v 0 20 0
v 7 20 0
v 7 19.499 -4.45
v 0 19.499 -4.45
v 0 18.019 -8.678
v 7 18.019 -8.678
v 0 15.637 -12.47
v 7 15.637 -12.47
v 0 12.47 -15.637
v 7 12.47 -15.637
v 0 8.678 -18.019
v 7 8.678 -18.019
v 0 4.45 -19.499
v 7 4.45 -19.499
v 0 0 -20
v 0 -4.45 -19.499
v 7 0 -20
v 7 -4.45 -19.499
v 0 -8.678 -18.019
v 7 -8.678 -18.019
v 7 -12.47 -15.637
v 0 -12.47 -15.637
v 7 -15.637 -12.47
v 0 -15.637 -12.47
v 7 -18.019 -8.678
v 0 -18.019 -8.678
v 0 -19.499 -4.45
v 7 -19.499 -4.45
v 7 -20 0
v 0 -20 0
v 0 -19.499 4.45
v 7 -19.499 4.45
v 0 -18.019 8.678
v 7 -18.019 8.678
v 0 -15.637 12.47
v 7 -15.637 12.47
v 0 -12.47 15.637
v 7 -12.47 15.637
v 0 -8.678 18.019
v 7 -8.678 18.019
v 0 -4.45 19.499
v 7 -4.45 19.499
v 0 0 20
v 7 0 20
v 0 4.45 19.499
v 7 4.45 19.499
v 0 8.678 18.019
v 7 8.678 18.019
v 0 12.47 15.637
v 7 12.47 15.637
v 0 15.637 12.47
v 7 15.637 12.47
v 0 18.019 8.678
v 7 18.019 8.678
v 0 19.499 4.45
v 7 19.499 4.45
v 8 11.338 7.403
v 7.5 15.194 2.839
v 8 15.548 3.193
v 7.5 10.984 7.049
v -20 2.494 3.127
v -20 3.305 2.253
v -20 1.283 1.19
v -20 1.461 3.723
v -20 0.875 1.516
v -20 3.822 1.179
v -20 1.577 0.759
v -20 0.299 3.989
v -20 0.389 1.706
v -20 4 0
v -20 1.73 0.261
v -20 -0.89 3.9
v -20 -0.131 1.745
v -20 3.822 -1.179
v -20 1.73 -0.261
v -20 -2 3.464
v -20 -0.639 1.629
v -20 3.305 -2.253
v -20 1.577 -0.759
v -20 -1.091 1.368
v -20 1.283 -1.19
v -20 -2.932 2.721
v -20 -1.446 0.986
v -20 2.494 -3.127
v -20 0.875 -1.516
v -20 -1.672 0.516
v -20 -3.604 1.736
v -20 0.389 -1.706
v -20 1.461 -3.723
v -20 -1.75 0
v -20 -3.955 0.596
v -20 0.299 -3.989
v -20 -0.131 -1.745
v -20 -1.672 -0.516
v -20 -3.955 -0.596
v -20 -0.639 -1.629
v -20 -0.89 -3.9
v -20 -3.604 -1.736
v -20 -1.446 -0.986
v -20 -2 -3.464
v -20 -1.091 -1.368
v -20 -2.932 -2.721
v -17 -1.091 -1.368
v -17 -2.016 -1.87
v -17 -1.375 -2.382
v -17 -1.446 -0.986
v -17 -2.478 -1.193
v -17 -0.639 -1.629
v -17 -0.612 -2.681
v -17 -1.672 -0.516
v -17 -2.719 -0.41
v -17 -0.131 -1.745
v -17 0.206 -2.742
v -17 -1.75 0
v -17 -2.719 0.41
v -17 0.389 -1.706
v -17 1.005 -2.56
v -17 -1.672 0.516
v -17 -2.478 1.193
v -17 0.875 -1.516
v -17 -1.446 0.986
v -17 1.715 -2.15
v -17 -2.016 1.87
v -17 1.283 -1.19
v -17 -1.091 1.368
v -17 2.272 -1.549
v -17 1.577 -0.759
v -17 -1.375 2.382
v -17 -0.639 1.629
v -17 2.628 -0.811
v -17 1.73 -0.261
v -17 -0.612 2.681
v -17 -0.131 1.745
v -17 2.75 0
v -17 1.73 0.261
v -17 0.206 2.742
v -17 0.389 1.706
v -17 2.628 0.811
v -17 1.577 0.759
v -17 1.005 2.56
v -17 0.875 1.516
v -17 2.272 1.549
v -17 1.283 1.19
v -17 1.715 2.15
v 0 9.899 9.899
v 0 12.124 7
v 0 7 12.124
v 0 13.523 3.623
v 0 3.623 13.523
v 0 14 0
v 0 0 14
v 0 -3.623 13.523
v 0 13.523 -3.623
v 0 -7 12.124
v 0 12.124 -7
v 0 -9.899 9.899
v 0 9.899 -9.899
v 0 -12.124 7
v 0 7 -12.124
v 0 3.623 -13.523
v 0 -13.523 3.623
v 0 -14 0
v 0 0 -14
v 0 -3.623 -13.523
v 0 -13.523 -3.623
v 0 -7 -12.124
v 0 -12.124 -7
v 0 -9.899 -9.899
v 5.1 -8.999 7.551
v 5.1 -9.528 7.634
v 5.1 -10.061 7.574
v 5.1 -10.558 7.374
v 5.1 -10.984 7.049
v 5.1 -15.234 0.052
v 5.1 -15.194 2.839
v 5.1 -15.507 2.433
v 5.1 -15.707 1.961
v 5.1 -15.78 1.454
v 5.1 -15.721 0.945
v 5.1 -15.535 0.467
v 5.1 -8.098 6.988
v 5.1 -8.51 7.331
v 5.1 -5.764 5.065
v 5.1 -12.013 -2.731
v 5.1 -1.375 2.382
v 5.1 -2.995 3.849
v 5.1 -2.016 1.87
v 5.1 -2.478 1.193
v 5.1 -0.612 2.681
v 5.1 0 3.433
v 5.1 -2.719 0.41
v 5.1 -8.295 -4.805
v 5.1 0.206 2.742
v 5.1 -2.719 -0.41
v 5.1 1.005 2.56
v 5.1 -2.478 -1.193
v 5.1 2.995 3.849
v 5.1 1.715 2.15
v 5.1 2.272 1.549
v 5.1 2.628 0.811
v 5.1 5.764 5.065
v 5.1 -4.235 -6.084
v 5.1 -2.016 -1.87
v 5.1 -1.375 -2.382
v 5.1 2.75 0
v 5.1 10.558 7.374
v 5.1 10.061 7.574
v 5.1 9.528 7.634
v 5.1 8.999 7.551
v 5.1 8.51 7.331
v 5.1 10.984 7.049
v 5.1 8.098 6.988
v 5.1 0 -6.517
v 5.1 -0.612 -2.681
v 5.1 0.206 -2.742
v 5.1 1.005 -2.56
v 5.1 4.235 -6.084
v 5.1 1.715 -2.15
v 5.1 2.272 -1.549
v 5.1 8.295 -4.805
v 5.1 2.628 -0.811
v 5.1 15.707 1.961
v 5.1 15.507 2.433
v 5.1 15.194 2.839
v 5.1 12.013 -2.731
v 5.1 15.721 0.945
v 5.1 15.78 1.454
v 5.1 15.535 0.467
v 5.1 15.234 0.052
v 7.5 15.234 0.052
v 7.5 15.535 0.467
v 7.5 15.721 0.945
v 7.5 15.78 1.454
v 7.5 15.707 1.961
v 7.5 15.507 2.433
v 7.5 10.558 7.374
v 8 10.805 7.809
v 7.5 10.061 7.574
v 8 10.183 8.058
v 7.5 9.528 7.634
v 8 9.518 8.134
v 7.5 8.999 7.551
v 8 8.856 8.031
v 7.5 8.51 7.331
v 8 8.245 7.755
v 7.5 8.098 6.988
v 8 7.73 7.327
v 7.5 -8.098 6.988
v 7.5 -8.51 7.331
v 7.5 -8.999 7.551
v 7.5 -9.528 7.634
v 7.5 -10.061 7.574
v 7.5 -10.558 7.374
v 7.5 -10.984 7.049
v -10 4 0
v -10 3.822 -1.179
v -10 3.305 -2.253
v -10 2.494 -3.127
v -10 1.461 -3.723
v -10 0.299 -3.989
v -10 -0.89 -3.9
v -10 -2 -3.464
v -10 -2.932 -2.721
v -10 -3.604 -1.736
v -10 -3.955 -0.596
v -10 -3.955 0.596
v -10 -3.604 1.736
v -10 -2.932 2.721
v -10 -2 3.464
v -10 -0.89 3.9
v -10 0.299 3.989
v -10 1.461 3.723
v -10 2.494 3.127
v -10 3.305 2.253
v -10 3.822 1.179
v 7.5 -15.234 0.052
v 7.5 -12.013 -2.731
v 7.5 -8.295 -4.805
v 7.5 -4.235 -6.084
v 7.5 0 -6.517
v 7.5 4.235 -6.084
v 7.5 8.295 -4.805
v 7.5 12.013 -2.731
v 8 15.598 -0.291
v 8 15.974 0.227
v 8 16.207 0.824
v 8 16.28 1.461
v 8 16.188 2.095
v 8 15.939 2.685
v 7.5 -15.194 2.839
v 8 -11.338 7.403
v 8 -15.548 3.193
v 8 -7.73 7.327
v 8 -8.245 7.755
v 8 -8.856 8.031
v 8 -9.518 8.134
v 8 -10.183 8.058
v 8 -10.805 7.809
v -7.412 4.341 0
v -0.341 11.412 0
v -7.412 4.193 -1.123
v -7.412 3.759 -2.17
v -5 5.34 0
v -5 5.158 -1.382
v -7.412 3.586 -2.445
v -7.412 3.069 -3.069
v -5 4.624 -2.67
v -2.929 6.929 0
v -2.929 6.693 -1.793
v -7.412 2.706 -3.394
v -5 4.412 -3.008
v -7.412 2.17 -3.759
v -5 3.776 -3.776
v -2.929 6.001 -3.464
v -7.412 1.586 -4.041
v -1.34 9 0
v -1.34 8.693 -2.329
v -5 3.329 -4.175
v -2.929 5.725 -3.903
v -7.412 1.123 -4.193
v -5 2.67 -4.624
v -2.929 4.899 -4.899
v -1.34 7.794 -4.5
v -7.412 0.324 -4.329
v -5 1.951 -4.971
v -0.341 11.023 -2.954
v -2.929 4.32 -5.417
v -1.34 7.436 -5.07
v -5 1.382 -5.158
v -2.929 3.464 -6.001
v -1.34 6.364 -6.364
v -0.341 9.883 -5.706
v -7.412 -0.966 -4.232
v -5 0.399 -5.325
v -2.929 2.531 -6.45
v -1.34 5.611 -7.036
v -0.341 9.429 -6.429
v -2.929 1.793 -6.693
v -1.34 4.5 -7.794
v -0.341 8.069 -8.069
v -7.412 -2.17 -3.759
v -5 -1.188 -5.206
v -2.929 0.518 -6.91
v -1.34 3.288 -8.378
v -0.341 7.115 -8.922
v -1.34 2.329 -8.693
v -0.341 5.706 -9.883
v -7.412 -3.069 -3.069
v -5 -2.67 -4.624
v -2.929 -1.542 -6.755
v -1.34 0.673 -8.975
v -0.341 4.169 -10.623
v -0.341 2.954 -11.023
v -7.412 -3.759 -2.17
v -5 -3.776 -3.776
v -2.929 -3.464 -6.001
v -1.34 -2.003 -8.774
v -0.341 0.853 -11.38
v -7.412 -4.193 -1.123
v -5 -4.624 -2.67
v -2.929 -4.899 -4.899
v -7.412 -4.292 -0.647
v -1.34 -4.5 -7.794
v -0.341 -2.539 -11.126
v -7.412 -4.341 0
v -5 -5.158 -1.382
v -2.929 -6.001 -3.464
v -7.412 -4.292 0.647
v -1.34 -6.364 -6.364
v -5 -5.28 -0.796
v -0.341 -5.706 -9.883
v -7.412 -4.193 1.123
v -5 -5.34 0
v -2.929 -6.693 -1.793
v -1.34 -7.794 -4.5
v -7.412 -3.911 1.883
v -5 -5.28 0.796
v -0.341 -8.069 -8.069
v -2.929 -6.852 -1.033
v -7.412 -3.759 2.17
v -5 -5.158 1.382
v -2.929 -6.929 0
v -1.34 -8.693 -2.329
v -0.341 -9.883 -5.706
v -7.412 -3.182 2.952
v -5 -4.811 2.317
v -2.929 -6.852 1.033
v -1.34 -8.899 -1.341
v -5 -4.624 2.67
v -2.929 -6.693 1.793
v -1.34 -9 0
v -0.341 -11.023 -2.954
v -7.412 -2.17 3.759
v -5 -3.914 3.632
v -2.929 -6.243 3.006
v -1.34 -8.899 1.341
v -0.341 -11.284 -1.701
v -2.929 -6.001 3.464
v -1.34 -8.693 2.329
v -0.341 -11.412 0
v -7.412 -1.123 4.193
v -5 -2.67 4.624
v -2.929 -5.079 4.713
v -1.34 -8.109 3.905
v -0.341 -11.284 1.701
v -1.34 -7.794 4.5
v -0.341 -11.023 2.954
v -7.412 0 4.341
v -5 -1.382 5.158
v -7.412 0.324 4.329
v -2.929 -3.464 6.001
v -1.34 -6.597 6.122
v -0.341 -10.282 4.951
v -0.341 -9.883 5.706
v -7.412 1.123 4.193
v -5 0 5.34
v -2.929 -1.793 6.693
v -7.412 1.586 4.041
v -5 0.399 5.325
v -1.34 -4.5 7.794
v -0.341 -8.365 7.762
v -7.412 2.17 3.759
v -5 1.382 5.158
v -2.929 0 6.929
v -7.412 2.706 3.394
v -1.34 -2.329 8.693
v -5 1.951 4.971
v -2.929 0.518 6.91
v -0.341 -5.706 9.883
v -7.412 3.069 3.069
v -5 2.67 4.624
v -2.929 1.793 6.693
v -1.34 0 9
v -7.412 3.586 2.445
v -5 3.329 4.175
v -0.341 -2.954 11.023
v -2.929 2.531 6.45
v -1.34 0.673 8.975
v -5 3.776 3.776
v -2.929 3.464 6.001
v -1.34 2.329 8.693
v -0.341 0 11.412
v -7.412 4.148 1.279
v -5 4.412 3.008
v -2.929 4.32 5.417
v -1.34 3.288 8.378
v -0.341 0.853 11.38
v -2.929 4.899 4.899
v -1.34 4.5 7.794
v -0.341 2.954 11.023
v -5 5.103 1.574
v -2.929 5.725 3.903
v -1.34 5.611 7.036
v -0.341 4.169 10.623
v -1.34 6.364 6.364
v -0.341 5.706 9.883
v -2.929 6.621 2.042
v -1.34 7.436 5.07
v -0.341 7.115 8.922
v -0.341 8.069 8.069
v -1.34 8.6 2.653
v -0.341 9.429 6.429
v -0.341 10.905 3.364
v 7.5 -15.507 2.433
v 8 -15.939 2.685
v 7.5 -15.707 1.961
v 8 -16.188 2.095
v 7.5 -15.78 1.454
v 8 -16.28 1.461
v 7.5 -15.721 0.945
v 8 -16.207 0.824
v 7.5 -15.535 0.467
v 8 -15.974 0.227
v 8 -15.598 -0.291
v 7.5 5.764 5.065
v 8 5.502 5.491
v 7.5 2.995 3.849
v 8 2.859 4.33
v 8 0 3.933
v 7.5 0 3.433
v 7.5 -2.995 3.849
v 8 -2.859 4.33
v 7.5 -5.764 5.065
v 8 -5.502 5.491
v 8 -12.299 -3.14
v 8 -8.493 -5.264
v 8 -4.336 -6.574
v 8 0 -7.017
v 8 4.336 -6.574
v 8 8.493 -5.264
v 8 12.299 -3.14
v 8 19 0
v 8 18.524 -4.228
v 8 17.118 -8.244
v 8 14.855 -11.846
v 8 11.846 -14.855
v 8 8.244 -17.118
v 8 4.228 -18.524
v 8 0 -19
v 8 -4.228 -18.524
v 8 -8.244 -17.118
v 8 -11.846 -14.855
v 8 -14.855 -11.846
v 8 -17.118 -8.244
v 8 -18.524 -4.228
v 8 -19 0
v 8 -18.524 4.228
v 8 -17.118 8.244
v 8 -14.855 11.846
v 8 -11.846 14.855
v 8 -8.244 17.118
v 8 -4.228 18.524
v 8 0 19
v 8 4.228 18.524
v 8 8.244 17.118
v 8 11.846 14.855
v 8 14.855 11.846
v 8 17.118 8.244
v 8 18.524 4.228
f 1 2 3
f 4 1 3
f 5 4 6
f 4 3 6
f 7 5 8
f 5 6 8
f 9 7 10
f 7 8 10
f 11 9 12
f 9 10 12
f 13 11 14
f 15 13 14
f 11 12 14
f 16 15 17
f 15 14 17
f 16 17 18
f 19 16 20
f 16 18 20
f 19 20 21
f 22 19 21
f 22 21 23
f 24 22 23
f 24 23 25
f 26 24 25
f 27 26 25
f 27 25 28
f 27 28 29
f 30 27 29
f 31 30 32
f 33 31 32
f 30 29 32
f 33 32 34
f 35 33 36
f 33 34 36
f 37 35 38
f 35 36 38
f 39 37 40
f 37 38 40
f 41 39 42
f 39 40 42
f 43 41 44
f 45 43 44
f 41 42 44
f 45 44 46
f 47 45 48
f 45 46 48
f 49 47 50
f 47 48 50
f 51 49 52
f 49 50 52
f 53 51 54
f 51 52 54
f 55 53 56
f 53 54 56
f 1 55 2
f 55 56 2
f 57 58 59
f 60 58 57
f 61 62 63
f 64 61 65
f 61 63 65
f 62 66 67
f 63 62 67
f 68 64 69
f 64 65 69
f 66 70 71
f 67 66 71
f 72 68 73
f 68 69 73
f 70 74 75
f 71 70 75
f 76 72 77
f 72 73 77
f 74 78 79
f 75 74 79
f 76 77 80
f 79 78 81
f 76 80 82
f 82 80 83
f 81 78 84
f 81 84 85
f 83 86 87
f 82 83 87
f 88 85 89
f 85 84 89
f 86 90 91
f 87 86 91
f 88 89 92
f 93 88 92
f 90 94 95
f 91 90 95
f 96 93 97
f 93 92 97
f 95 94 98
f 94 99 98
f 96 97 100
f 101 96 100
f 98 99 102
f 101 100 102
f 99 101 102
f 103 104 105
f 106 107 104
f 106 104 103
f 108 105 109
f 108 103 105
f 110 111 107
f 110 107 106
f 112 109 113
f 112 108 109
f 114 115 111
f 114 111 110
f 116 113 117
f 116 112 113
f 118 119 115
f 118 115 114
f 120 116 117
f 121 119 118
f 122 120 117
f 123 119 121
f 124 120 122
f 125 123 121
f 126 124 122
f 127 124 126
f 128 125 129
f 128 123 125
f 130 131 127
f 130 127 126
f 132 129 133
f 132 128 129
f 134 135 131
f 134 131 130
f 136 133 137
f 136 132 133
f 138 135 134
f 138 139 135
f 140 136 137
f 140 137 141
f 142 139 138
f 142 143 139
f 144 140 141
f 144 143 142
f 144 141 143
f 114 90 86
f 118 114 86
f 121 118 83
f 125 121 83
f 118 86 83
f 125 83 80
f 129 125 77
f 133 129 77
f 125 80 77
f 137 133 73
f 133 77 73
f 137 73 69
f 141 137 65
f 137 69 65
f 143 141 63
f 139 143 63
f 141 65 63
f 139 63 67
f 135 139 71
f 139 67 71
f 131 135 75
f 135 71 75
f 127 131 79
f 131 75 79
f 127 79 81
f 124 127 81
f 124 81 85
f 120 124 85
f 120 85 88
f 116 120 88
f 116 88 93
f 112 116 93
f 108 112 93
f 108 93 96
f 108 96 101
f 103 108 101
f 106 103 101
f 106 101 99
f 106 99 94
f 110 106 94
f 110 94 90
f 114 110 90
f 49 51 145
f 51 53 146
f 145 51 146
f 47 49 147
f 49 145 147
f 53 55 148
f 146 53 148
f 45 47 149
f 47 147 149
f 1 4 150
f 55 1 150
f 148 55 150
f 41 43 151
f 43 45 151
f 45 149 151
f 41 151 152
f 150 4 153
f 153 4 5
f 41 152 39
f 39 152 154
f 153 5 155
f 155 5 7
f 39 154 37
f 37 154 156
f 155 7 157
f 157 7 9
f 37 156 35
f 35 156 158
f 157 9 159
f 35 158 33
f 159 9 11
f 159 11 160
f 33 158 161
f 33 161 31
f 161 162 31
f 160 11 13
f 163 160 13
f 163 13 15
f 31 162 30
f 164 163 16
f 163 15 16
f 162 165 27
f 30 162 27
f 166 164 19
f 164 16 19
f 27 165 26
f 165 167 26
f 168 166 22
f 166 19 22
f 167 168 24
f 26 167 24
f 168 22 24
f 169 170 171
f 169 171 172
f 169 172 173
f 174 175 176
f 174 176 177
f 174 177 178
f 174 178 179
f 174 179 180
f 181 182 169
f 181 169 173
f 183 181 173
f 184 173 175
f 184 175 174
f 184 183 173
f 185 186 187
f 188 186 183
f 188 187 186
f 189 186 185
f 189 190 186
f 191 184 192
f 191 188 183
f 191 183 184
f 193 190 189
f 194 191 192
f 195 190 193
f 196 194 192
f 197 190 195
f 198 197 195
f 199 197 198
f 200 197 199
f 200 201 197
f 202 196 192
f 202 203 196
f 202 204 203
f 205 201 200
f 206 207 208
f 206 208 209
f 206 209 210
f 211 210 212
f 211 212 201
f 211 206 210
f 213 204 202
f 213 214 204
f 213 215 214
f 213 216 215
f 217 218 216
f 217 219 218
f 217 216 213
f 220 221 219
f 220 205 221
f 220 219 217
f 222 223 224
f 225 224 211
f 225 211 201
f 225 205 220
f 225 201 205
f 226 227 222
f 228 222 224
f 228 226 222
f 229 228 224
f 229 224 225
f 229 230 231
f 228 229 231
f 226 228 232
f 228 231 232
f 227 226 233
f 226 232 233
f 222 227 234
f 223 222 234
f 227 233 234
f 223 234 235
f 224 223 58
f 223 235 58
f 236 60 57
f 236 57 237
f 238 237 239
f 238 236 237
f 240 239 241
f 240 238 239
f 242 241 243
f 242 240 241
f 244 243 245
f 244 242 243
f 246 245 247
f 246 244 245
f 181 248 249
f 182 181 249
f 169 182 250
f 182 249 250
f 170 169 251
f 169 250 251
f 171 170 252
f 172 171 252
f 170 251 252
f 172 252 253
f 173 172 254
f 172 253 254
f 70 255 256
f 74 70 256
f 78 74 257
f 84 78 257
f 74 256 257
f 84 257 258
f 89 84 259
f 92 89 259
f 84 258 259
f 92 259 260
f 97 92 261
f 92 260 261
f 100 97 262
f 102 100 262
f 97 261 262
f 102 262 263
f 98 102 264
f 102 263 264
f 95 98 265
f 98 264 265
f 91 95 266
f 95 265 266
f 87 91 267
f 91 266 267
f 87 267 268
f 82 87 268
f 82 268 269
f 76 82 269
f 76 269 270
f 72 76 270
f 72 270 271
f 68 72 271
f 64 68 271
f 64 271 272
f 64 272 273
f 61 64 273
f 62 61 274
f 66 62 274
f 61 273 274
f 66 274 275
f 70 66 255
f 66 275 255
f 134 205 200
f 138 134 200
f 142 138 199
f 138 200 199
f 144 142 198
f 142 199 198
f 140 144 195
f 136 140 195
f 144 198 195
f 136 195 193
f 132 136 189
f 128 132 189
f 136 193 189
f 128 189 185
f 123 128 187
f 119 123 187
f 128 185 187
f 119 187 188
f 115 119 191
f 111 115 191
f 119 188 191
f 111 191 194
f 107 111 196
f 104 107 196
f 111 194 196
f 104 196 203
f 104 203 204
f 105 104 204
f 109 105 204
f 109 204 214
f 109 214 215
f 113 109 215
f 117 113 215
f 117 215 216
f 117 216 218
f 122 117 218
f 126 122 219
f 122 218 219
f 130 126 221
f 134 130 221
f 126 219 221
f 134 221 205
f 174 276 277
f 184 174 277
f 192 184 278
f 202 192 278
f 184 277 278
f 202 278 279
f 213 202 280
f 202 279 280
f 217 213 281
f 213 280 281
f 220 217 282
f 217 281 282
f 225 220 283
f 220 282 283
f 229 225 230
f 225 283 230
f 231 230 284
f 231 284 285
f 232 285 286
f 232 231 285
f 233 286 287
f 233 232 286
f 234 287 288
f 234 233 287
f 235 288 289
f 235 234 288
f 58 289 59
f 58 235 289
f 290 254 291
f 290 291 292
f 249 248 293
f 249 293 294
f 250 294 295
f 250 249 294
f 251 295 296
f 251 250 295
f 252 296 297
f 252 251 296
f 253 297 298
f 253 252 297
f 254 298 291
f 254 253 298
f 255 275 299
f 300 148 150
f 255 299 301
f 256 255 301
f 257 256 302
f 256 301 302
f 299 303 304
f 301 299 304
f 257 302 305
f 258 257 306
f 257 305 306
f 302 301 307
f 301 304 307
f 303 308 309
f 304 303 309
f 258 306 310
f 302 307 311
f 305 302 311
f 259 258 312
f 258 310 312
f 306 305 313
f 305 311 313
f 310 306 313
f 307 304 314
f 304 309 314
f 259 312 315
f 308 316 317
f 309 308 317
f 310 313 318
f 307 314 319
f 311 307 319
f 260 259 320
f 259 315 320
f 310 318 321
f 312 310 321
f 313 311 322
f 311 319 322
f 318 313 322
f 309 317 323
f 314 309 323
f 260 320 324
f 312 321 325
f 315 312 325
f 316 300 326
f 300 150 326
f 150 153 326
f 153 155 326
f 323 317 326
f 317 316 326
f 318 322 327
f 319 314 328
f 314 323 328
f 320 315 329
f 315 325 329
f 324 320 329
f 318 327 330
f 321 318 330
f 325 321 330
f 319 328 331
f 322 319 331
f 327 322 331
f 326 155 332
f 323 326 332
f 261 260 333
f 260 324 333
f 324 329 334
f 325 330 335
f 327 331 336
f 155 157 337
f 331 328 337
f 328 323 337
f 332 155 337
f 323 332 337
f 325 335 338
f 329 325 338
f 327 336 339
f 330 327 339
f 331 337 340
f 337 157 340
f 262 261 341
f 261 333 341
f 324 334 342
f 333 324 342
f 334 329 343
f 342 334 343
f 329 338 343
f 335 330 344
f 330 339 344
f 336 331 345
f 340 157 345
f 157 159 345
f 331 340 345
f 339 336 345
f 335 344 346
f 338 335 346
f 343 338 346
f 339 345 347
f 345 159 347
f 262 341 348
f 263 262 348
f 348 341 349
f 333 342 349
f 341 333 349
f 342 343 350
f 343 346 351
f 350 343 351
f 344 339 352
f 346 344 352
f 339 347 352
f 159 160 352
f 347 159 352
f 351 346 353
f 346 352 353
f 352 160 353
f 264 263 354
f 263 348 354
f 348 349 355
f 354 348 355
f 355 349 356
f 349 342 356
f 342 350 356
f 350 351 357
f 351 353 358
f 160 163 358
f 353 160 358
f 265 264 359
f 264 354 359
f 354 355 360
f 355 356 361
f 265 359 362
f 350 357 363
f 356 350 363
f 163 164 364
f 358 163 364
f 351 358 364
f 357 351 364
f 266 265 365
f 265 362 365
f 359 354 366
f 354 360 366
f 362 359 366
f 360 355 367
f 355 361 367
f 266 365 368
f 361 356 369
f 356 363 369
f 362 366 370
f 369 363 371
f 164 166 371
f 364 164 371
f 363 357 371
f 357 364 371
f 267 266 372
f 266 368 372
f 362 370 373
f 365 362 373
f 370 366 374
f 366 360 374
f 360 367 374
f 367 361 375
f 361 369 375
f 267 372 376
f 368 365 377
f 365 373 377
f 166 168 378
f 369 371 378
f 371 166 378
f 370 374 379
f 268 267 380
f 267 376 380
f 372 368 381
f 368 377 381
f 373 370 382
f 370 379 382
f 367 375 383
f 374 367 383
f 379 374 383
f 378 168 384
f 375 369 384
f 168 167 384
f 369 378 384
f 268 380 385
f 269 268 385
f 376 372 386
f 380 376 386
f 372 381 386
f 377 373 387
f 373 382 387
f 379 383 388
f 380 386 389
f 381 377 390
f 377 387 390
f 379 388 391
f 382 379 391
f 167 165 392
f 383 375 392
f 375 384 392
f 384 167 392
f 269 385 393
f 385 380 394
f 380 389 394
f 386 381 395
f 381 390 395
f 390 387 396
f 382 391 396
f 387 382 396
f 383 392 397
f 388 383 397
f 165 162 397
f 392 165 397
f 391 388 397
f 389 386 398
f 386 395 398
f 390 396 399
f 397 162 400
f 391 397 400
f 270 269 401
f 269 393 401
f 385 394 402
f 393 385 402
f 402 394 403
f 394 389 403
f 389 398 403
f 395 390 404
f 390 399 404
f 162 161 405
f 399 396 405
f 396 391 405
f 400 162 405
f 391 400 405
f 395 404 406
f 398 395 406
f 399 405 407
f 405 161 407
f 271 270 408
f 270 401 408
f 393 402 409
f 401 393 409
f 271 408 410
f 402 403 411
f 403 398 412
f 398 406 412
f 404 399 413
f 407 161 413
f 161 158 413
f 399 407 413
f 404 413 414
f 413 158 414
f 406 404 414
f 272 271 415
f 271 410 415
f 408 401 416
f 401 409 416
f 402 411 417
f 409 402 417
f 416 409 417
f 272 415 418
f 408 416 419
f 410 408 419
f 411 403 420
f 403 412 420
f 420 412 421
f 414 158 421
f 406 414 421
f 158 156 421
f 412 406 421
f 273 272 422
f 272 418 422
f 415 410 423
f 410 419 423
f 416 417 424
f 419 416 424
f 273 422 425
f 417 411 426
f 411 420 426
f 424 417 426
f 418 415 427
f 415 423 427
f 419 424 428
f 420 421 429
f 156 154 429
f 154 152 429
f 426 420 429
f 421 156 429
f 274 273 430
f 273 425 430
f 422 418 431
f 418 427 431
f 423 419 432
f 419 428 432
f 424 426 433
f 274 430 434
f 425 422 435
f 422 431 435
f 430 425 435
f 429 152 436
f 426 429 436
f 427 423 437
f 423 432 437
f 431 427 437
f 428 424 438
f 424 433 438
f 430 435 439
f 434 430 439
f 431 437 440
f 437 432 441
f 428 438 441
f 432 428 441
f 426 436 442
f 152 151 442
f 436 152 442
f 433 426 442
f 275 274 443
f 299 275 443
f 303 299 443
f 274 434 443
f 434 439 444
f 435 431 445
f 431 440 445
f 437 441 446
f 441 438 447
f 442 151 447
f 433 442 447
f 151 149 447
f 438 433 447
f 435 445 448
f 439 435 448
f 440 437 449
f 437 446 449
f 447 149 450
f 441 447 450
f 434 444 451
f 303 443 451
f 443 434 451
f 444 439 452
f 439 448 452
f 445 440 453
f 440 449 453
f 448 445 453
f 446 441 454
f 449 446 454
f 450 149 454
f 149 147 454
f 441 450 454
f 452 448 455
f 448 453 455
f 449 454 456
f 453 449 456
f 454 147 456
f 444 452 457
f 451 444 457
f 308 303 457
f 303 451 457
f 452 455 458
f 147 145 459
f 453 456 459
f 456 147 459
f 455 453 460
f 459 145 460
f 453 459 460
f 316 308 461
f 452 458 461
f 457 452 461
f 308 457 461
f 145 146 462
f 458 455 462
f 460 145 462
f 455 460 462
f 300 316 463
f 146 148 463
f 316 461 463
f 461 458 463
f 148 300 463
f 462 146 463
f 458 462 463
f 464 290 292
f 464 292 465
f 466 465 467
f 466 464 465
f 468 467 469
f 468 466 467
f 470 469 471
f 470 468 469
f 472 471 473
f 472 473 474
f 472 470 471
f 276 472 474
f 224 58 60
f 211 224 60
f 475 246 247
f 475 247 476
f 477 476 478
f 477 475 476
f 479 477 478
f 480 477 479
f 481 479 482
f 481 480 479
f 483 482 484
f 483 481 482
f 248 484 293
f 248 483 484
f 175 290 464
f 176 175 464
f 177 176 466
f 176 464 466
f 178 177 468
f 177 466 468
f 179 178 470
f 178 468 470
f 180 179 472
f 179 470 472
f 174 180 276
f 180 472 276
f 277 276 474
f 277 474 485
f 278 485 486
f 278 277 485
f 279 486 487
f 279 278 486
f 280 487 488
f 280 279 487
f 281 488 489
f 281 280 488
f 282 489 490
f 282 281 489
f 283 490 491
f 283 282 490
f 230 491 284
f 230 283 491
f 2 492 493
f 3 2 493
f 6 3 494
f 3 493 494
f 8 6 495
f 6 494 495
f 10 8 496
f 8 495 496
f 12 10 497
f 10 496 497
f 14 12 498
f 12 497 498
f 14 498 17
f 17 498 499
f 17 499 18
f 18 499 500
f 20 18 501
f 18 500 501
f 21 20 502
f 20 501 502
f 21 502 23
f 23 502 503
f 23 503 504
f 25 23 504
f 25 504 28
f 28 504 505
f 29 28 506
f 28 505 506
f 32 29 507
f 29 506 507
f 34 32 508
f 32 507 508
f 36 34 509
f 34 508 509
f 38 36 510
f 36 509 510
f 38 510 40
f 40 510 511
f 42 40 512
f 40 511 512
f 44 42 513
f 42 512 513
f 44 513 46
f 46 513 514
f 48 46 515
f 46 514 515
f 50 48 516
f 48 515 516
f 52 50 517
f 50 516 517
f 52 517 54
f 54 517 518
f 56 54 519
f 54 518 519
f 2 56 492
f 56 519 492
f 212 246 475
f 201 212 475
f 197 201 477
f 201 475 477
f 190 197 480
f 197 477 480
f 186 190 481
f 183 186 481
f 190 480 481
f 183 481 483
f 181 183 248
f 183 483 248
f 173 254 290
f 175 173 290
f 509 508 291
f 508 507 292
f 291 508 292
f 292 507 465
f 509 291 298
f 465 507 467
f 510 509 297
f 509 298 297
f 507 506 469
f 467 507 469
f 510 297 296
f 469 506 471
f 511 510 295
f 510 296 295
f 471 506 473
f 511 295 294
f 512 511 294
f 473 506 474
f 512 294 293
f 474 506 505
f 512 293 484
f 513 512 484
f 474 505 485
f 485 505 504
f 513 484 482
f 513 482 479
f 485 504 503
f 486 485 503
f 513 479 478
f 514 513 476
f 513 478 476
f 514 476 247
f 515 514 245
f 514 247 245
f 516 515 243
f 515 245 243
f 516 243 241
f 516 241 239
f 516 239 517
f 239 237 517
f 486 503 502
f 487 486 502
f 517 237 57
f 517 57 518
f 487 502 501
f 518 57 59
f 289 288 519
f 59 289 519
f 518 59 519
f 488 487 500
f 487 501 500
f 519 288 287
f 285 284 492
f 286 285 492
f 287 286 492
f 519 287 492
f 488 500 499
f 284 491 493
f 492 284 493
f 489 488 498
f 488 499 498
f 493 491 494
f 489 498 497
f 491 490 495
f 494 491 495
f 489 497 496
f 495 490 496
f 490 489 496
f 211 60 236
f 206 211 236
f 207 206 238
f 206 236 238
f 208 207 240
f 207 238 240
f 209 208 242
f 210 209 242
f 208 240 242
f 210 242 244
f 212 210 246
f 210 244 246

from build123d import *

# Parameters (mm, degrees)
CORTAR_EXTRUIR1_DEPTH = 2.9
REDONDEO1_R           = 10
CORTAR_EXTRUIR2_REACH = 41.799
CROQUIS3_R            = 1.75
CROQUIS4_R            = 2.75
CORTAR_EXTRUIR3_DEPTH = 22.1
CHAFL_N1_SIZE         = 1
CHAFL_N2_SIZE         = 0.5


with BuildPart() as part:
    # Croquis1 → Revolución1 (revolve)
    with BuildSketch(Plane.XY):
        Polygon((-20, 0), (-20, 4), (0, 4), (0, 20), (8, 20), (8, 0), align=None)
    revolve(axis=Axis((8, 0, 0), (-1, 0, 0)))

    # Croquis2 → Cortar-Extruir1 (cut)
    with BuildSketch(Plane(origin=(8, 0, 0), x_dir=(0, 0, -1), z_dir=(1, 0, 0))):
        with BuildLine():
            Line((-2.839199656, 15.194118815), (-7.049029232, 10.984289239))
            ThreePointArc((-7.049029232, 10.984289239), (-7.634375098, 9.528098398), (-6.988431485, 8.097756342))
            ThreePointArc((-6.988431485, 8.097756342), (-3.433318471, 0), (-6.988431485, -8.097756342))
            ThreePointArc((-6.988431485, -8.097756342), (-7.634375098, -9.528098398), (-7.049029232, -10.984289239))
            Line((-7.049029232, -10.984289239), (-2.839199656, -15.194118815))
            ThreePointArc((-2.839199656, -15.194118815), (-1.453779812, -15.779697972), (-0.052075025, -15.234248815))
            ThreePointArc((-0.052075025, -15.234248815), (6.516681529, 0), (-0.052075025, 15.234248815))
            ThreePointArc((-0.052075025, 15.234248815), (-1.453779812, 15.779697972), (-2.839199656, 15.194118815))
        make_face()
    extrude(amount=-CORTAR_EXTRUIR1_DEPTH, mode=Mode.SUBTRACT)

    # Redondeo1
    redondeo1_edges = [part.edges().sort_by_distance(p)[0] for p in [
        (0, -4, 0),
    ]]
    fillet(redondeo1_edges, radius=REDONDEO1_R)

    # Croquis3 → Cortar-Extruir2 (cut, up to next)
    with BuildSketch(Plane.ZY.offset(20), mode=Mode.PRIVATE) as cortar_extruir2_sk1:
        with Locations(Location((0, 0, 0), (0, 0, 270))):
            Circle(CROQUIS3_R)
    cortar_extruir2_tool1 = extrude(cortar_extruir2_sk1.sketch, amount=-CORTAR_EXTRUIR2_REACH, mode=Mode.PRIVATE) & part.part
    add(cortar_extruir2_tool1.solids().sort_by_distance((-20, 0, 0))[0], mode=Mode.SUBTRACT)

    # Croquis4 → Cortar-Extruir3 (cut)
    with BuildSketch(Plane(origin=(5.1, 0, 0), x_dir=(0, 0, -1), z_dir=(1, 0, 0))):
        with Locations(Location((0, 0, 0), (0, 0, 90))):
            Circle(CROQUIS4_R)
    extrude(amount=-CORTAR_EXTRUIR3_DEPTH, mode=Mode.SUBTRACT)

    # Chaflán1
    chafl_n1_edges = [part.edges().sort_by_distance(p)[0] for p in [
        (8, -20, 0),
    ]]
    chamfer(chafl_n1_edges, length=CHAFL_N1_SIZE)

    # Chaflán2
    chafl_n2_edges = [part.edges().sort_by_distance(p)[0] for p in [
        (8, -15.779697972, 1.453779812),
        (8, 0, -6.516681529),
        (8, 15.779697972, 1.453779812),
        (8, 13.089204027, 4.944114444),
        (8, 9.528098398, 7.634375098),
        (8, 0, 3.433318471),
        (8, -9.528098398, 7.634375098),
        (8, -13.089204027, 4.944114444),
    ]]
    chamfer(chafl_n2_edges, length=CHAFL_N2_SIZE)


solid = part.part
